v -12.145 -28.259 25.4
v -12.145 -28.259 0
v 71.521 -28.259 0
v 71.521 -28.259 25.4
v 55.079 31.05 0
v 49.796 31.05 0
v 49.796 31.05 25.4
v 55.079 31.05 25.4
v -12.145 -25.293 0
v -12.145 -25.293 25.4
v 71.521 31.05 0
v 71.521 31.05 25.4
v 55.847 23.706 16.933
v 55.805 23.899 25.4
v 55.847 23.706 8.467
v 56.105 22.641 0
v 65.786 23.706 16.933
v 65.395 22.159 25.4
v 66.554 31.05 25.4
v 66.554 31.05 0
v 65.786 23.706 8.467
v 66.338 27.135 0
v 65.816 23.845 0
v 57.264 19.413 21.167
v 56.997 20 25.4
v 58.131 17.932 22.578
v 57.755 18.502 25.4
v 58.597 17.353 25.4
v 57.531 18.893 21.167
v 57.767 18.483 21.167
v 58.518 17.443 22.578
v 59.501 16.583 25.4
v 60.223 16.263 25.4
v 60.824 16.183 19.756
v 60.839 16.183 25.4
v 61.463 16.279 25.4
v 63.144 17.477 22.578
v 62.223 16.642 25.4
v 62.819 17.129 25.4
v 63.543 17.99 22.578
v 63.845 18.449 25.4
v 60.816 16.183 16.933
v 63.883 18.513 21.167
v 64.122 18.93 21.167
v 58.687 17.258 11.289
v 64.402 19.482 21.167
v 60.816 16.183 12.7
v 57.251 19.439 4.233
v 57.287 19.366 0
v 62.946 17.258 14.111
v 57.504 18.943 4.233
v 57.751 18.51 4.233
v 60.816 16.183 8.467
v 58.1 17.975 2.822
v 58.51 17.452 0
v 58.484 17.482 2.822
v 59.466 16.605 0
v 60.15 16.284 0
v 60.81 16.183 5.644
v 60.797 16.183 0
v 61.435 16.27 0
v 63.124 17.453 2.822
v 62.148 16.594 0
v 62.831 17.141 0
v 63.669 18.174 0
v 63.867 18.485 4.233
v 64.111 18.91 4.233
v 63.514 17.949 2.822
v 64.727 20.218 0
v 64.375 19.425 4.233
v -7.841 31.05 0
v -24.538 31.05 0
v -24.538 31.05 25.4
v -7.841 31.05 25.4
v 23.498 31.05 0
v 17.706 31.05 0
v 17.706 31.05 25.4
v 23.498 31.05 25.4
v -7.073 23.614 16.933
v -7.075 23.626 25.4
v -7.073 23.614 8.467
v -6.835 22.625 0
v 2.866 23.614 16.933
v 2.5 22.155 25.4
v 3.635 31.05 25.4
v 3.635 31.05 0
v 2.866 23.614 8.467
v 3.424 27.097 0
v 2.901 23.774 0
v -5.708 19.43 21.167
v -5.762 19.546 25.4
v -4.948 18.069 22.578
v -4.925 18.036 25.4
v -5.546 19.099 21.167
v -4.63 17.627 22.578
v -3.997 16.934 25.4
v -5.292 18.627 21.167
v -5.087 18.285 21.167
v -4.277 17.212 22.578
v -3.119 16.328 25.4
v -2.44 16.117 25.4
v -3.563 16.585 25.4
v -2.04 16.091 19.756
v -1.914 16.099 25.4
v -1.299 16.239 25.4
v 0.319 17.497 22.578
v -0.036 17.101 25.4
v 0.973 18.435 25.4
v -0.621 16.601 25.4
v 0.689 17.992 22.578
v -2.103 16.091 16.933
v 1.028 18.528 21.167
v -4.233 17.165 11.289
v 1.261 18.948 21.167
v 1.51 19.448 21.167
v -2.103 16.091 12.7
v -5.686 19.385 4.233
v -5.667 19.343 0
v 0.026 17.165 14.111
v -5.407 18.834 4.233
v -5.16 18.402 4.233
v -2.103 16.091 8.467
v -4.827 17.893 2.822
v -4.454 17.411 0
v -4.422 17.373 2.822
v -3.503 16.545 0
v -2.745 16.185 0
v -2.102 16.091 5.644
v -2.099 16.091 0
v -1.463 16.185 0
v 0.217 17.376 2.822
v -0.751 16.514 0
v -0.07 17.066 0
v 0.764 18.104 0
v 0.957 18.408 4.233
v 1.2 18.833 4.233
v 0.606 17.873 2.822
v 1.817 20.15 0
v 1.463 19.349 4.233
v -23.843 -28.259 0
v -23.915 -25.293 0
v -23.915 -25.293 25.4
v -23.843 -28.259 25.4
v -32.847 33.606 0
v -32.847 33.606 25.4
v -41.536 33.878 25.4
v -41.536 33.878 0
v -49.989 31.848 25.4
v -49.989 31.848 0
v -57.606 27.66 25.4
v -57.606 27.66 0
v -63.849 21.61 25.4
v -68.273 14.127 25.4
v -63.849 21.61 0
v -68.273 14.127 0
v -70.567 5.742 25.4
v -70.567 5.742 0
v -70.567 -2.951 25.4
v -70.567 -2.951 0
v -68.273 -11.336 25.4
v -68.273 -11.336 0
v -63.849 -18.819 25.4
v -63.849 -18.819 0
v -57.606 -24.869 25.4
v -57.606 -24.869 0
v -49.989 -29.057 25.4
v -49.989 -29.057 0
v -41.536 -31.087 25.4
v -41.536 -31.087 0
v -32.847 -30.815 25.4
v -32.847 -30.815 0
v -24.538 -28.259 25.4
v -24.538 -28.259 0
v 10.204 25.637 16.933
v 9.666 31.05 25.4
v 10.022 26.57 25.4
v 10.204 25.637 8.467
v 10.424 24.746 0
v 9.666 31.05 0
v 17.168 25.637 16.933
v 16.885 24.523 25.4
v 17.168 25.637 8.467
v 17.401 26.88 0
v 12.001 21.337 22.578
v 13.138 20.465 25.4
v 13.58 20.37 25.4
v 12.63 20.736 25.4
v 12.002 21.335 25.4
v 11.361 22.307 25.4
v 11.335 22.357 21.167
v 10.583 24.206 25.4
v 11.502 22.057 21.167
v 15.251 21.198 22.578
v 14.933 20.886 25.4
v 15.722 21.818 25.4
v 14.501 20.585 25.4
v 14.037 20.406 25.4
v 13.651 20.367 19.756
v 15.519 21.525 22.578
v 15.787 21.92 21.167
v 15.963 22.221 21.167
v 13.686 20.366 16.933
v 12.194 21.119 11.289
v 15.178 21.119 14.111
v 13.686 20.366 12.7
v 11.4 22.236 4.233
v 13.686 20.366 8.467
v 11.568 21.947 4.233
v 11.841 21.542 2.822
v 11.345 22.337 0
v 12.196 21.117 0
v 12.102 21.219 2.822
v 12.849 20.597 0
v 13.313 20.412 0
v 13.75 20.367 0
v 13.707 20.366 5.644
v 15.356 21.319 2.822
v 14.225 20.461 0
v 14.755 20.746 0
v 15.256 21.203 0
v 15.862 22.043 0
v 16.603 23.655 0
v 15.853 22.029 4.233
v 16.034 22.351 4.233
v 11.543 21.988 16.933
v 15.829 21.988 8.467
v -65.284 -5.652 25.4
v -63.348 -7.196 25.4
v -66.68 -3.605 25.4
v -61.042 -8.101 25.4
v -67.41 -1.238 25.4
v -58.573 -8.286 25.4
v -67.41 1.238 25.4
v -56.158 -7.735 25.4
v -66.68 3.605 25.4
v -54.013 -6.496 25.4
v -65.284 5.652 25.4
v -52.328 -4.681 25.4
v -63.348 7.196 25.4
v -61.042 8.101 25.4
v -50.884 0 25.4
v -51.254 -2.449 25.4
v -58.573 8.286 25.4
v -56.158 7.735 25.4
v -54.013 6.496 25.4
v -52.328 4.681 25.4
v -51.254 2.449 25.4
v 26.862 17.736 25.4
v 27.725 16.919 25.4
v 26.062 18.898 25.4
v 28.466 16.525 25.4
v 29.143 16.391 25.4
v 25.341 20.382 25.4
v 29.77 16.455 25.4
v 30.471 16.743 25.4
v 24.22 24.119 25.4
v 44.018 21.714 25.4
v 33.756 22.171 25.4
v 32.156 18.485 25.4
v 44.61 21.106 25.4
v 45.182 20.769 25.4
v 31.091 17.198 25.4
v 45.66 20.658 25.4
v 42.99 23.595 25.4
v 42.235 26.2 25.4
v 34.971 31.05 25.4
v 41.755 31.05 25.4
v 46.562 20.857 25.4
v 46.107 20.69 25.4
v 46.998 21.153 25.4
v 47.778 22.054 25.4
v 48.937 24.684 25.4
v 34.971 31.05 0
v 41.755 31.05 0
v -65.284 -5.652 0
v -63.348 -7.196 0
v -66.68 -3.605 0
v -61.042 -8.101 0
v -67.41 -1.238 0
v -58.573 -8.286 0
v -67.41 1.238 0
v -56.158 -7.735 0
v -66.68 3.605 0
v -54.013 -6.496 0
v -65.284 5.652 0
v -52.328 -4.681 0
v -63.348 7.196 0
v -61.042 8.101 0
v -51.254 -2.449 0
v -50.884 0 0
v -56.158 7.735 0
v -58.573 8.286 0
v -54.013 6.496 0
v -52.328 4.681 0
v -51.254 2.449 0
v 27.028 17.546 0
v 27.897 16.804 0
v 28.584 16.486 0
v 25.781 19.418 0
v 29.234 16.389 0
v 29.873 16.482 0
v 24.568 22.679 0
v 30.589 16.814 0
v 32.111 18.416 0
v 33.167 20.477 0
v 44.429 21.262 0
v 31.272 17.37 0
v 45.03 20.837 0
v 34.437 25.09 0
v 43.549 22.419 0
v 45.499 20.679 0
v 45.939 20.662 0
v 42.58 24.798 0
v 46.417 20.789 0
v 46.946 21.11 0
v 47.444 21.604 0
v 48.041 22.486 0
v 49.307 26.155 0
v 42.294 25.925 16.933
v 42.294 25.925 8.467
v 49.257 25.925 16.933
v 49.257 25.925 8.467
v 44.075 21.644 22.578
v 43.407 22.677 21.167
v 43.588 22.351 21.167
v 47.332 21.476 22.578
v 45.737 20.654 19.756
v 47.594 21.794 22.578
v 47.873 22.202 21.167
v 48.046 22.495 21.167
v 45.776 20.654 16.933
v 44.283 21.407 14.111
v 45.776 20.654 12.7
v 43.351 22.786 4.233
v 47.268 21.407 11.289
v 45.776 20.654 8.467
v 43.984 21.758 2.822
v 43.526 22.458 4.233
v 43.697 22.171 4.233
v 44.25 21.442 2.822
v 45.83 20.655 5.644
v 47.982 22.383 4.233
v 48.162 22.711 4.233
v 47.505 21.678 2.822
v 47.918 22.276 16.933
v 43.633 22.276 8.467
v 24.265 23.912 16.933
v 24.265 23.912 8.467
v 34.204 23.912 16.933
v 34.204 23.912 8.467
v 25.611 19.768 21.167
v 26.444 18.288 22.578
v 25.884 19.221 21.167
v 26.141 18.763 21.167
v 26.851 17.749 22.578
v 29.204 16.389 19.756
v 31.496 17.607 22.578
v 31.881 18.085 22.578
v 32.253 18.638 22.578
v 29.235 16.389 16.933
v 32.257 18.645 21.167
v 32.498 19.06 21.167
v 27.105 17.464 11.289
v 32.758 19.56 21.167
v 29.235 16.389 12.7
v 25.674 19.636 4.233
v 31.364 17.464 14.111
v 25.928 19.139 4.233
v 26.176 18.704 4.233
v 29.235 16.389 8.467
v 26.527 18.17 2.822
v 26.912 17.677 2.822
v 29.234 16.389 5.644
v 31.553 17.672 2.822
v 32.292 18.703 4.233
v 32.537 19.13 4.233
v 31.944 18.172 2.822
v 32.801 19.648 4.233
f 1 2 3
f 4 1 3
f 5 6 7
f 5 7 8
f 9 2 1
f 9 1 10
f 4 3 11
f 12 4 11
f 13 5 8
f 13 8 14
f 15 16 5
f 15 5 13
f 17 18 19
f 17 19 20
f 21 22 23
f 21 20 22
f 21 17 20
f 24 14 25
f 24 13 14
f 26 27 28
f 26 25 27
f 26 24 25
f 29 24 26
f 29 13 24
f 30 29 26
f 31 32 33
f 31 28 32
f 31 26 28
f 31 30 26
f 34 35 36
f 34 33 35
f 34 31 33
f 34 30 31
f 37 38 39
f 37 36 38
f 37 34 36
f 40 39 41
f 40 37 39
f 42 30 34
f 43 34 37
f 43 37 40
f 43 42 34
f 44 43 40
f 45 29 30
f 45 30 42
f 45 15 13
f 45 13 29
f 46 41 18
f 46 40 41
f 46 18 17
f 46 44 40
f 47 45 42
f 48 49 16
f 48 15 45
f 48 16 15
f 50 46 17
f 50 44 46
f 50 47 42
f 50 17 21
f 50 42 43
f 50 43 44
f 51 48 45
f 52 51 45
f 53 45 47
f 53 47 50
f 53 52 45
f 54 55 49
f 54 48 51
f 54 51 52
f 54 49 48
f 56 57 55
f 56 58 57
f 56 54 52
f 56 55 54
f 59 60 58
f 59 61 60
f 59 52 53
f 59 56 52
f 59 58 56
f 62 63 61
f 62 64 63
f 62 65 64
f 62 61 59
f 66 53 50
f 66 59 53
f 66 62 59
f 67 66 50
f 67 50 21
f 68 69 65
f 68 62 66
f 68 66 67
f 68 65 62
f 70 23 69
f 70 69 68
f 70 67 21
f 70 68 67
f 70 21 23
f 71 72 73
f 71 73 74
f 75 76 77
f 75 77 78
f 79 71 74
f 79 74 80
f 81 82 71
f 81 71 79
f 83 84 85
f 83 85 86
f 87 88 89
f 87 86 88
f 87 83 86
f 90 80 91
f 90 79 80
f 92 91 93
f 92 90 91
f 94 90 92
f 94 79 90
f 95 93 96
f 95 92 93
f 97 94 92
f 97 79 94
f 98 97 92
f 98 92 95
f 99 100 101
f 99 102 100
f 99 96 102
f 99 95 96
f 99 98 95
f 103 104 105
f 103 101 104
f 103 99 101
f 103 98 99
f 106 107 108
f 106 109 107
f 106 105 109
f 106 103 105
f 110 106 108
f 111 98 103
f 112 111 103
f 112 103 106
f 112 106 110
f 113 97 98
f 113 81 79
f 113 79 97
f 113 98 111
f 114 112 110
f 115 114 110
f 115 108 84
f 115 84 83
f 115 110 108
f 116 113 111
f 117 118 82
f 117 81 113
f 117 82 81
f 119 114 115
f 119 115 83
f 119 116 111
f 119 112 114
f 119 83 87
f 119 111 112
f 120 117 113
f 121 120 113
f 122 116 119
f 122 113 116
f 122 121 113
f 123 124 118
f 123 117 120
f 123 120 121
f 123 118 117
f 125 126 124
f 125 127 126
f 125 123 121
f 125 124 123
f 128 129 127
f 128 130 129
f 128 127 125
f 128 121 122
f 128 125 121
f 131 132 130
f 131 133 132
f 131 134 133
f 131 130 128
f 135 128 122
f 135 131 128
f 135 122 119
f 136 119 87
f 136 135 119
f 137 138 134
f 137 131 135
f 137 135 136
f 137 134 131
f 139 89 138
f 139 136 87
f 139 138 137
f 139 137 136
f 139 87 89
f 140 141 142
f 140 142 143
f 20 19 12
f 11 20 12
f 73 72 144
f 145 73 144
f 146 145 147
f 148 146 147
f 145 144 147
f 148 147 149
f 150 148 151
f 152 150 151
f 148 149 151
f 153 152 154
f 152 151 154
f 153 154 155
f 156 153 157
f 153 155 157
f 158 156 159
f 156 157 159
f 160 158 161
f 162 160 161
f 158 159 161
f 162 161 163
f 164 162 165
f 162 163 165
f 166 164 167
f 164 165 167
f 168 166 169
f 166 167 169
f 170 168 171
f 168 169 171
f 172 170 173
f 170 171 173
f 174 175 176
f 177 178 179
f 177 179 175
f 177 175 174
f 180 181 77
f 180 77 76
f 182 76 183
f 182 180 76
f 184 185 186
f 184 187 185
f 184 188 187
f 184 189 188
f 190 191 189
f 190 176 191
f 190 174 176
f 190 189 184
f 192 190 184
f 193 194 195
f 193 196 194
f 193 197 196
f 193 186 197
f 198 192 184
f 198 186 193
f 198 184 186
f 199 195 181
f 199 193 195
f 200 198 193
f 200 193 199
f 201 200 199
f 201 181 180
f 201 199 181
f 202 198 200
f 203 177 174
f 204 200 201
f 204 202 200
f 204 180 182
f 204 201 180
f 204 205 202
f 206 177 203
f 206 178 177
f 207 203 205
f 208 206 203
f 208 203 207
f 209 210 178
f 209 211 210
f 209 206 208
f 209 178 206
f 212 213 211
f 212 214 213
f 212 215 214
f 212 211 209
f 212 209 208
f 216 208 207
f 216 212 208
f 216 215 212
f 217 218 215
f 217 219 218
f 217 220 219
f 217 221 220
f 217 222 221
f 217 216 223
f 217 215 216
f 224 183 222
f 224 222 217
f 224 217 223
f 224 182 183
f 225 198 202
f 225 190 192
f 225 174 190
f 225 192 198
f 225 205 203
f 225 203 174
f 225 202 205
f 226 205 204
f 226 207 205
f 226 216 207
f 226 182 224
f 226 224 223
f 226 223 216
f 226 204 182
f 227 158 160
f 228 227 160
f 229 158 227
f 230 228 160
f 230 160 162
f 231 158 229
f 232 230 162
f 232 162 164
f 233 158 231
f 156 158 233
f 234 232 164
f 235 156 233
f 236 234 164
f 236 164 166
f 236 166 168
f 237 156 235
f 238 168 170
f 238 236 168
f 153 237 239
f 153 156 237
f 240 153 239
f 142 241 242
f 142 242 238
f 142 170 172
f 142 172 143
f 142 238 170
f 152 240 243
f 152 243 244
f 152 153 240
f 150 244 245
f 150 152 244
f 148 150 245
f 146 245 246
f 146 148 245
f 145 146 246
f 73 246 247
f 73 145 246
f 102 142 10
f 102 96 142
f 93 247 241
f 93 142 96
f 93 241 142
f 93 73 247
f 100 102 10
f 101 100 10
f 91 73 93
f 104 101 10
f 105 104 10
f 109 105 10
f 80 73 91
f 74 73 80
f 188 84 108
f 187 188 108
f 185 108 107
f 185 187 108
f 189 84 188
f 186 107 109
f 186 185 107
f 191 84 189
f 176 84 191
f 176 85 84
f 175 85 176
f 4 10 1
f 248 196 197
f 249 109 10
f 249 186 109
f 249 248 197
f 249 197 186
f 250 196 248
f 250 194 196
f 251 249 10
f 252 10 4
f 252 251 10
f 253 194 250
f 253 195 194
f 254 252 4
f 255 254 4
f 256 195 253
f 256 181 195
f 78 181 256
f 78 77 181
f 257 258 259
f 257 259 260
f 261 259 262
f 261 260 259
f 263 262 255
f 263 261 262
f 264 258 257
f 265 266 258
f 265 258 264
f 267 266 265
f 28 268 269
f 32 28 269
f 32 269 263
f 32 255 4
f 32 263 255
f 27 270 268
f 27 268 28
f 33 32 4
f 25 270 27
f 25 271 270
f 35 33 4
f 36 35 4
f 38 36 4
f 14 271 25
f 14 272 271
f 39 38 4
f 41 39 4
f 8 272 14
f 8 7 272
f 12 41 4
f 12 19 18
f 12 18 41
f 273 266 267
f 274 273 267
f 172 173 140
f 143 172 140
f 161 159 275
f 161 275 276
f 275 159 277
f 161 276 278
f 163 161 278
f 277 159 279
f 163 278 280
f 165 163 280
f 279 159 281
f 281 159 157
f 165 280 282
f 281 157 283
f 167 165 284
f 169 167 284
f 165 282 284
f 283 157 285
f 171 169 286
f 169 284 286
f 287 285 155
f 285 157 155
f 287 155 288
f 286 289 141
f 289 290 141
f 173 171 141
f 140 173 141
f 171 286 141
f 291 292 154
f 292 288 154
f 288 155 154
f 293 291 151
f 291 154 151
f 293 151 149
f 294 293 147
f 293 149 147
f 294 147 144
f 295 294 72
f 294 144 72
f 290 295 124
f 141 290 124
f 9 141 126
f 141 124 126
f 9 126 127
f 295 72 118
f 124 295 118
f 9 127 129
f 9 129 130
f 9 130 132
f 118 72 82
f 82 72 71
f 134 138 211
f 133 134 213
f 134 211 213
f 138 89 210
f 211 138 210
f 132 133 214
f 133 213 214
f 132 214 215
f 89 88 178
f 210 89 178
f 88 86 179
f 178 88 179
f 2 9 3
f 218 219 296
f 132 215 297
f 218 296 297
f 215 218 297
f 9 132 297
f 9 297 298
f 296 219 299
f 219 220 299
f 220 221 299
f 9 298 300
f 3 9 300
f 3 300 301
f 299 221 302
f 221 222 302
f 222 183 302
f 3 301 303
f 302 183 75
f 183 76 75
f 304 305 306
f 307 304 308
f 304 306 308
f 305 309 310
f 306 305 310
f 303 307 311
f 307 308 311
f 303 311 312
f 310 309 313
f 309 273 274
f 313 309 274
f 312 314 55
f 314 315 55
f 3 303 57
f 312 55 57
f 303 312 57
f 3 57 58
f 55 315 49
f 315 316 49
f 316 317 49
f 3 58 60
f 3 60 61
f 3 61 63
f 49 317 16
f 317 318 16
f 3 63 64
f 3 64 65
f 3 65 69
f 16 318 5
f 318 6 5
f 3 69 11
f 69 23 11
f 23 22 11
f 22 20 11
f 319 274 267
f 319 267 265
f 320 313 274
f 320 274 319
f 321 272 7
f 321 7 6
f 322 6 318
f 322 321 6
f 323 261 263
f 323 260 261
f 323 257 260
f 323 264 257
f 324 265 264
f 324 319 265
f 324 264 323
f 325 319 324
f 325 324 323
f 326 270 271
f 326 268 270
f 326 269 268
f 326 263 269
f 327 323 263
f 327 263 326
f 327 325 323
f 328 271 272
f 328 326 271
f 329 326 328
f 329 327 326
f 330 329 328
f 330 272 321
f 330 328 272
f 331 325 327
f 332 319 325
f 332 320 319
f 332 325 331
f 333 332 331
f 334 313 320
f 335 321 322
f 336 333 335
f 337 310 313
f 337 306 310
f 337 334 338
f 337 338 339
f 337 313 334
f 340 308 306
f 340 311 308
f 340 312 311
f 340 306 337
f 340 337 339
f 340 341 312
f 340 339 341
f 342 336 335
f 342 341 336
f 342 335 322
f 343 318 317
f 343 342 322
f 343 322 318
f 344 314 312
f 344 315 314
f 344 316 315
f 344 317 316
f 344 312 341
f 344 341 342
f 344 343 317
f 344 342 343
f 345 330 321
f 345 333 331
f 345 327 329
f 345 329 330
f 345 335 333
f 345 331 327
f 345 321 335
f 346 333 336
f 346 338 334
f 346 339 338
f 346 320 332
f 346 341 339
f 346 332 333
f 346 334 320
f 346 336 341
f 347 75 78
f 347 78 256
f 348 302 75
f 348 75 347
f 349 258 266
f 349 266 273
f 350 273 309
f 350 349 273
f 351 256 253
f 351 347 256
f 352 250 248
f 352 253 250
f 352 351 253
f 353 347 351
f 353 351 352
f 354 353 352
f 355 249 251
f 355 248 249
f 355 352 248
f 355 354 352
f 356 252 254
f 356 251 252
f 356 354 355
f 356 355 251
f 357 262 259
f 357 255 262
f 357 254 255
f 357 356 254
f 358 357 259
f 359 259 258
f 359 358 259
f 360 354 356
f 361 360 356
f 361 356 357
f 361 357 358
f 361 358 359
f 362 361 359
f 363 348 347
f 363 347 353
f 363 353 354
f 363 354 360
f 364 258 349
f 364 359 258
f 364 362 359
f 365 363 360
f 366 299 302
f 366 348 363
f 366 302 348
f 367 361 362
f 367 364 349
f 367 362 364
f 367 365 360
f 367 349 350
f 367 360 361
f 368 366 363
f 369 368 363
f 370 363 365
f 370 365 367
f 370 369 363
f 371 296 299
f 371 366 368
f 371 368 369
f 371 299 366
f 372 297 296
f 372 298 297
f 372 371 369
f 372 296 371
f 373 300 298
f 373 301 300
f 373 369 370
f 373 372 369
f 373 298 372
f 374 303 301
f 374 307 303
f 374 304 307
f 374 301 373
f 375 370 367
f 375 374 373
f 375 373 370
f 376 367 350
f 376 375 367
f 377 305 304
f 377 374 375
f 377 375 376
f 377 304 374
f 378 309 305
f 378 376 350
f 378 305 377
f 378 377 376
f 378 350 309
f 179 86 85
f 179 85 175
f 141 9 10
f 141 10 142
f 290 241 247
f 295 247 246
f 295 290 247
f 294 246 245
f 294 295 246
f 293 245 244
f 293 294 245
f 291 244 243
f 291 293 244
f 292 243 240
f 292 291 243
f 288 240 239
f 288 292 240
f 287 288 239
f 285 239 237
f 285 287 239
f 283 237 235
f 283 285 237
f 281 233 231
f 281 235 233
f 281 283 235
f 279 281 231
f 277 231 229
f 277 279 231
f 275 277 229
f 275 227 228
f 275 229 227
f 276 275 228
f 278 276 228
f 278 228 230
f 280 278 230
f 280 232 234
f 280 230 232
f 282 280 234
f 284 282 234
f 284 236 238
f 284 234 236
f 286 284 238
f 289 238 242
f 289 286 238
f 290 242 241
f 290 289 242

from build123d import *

# Parameters (mm, degrees)
F0_W      = 96.0585176945
F0_H      = 59.3097396195
F1_DEPTH  = 25.4
F2_R      = 6.9698590231
F3_DEPTH  = 25.4
F4_R      = 8.3090946214
F5_DEPTH  = 43.688
F7_DEPTH  = 28.702
F9_DEPTH  = 25.4
F11_DEPTH = 36.83


with BuildPart() as f1:
    # F0 (on Top) → F1 (new body)
    with BuildSketch(Plane.XY):
        with Locations((23.4913080931, 1.3955235481)):
            Rectangle(F0_W, F0_H)
        with BuildLine():
            Line((-24.5379507542, -28.2593462616), (-24.5379507542, 31.0503933579))
            ThreePointArc((-24.5379507542, 31.0503933579), (-70.8578223618, 1.3955235481), (-24.5379507542, -28.2593462616))
        make_face()
    extrude(amount=F1_DEPTH)

    # F2 (on Top) → F3 (join)
    with BuildSketch(Plane.XY):
        with Locations((-53.8439378142, 0)):
            Circle(F2_R)
    extrude(amount=F3_DEPTH)

    # F4 (on Top) → F5 (cut)
    with BuildSketch(Plane.XY):
        with Locations((-59.1934472322, 0)):
            Circle(F4_R)
    extrude(amount=F5_DEPTH, mode=Mode.SUBTRACT)

    # F6 (on Top) → F7 (cut)
    with BuildSketch(Plane.XY):
        with BuildLine():
            add(Edge.make_bspline(
                [(-2.1032807417, 46.1836736649), (-12.042039887, 46.1836736649), (-7.0726603144, 23.6138207838), (-2.1032807417, 1.0439679027), (2.8660988309, 23.6138207838), (7.8354784036, 46.1836736649), (-2.1032807417, 46.1836736649)],
                knots=[0, 0, 0, 2.0943951024, 2.0943951024, 4.1887902048, 4.1887902048, 6.2831853072, 6.2831853072, 6.2831853072], degree=2, weights=[1, 0.5, 1, 0.5, 1, 0.5, 1]))
        make_face()
        with BuildLine():
            add(Edge.make_bspline(
                [(13.6858932674, 41.4513960598), (6.7221471859, 41.4513960598), (10.2040202267, 25.6374778168), (13.6858932674, 9.8235595737), (17.1677663081, 25.6374778168), (20.6496393489, 41.4513960598), (13.6858932674, 41.4513960598)],
                knots=[0, 0, 0, 2.0943951024, 2.0943951024, 4.1887902048, 4.1887902048, 6.2831853072, 6.2831853072, 6.2831853072], degree=2, weights=[1, 0.5, 1, 0.5, 1, 0.5, 1]))
        make_face()
        with BuildLine():
            add(Edge.make_bspline(
                [(29.2345341295, 46.4820731431), (19.2957749842, 46.4820731431), (24.2651545569, 23.912220262), (29.2345341295, 1.3423673809), (34.2039137021, 23.912220262), (39.1732932748, 46.4820731431), (29.2345341295, 46.4820731431)],
                knots=[0, 0, 0, 2.0943951024, 2.0943951024, 4.1887902048, 4.1887902048, 6.2831853072, 6.2831853072, 6.2831853072], degree=2, weights=[1, 0.5, 1, 0.5, 1, 0.5, 1]))
        make_face()
        with BuildLine():
            add(Edge.make_bspline(
                [(45.7755737007, 41.7389214156), (38.8118276192, 41.7389214156), (42.2937006599, 25.9250031726), (45.7755737007, 10.1110849296), (49.2574467414, 25.9250031726), (52.7393197821, 41.7389214156), (45.7755737007, 41.7389214156)],
                knots=[0, 0, 0, 2.0943951024, 2.0943951024, 4.1887902048, 4.1887902048, 6.2831853072, 6.2831853072, 6.2831853072], degree=2, weights=[1, 0.5, 1, 0.5, 1, 0.5, 1]))
        make_face()
        with BuildLine():
            add(Edge.make_bspline(
                [(60.8162461653, 46.2759053466), (50.87748702, 46.2759053466), (55.8468665926, 23.7060524655), (60.8162461653, 1.1361995844), (65.7856257379, 23.7060524655), (70.7550053106, 46.2759053466), (60.8162461653, 46.2759053466)],
                knots=[0, 0, 0, 2.0943951024, 2.0943951024, 4.1887902048, 4.1887902048, 6.2831853072, 6.2831853072, 6.2831853072], degree=2, weights=[1, 0.5, 1, 0.5, 1, 0.5, 1]))
        make_face()
    extrude(amount=F7_DEPTH, mode=Mode.SUBTRACT)

    # F8 (on Top) → F9 (cut)
    with BuildSketch(Plane.XY):
        Polygon((71.7460587621, -22.2876053303), (-17.4043662846, -22.2876053303), (-17.4043662846, -27.296056971), (-17.4043662846, -33.5566177964), (71.7460587621, -33.5566177964), align=None)
    extrude(amount=-F9_DEPTH, mode=Mode.SUBTRACT)

    # F10 (on Top) → F11 (cut)
    with BuildSketch(Plane.XY):
        Polygon((-23.9153504372, -25.2926759422), (-23.6649308354, -35.5600006878), (-12.1454931796, -35.5600006878), (-12.1454931796, -25.2926759422), align=None)
    extrude(amount=F11_DEPTH, mode=Mode.SUBTRACT)


solid = f1.part
